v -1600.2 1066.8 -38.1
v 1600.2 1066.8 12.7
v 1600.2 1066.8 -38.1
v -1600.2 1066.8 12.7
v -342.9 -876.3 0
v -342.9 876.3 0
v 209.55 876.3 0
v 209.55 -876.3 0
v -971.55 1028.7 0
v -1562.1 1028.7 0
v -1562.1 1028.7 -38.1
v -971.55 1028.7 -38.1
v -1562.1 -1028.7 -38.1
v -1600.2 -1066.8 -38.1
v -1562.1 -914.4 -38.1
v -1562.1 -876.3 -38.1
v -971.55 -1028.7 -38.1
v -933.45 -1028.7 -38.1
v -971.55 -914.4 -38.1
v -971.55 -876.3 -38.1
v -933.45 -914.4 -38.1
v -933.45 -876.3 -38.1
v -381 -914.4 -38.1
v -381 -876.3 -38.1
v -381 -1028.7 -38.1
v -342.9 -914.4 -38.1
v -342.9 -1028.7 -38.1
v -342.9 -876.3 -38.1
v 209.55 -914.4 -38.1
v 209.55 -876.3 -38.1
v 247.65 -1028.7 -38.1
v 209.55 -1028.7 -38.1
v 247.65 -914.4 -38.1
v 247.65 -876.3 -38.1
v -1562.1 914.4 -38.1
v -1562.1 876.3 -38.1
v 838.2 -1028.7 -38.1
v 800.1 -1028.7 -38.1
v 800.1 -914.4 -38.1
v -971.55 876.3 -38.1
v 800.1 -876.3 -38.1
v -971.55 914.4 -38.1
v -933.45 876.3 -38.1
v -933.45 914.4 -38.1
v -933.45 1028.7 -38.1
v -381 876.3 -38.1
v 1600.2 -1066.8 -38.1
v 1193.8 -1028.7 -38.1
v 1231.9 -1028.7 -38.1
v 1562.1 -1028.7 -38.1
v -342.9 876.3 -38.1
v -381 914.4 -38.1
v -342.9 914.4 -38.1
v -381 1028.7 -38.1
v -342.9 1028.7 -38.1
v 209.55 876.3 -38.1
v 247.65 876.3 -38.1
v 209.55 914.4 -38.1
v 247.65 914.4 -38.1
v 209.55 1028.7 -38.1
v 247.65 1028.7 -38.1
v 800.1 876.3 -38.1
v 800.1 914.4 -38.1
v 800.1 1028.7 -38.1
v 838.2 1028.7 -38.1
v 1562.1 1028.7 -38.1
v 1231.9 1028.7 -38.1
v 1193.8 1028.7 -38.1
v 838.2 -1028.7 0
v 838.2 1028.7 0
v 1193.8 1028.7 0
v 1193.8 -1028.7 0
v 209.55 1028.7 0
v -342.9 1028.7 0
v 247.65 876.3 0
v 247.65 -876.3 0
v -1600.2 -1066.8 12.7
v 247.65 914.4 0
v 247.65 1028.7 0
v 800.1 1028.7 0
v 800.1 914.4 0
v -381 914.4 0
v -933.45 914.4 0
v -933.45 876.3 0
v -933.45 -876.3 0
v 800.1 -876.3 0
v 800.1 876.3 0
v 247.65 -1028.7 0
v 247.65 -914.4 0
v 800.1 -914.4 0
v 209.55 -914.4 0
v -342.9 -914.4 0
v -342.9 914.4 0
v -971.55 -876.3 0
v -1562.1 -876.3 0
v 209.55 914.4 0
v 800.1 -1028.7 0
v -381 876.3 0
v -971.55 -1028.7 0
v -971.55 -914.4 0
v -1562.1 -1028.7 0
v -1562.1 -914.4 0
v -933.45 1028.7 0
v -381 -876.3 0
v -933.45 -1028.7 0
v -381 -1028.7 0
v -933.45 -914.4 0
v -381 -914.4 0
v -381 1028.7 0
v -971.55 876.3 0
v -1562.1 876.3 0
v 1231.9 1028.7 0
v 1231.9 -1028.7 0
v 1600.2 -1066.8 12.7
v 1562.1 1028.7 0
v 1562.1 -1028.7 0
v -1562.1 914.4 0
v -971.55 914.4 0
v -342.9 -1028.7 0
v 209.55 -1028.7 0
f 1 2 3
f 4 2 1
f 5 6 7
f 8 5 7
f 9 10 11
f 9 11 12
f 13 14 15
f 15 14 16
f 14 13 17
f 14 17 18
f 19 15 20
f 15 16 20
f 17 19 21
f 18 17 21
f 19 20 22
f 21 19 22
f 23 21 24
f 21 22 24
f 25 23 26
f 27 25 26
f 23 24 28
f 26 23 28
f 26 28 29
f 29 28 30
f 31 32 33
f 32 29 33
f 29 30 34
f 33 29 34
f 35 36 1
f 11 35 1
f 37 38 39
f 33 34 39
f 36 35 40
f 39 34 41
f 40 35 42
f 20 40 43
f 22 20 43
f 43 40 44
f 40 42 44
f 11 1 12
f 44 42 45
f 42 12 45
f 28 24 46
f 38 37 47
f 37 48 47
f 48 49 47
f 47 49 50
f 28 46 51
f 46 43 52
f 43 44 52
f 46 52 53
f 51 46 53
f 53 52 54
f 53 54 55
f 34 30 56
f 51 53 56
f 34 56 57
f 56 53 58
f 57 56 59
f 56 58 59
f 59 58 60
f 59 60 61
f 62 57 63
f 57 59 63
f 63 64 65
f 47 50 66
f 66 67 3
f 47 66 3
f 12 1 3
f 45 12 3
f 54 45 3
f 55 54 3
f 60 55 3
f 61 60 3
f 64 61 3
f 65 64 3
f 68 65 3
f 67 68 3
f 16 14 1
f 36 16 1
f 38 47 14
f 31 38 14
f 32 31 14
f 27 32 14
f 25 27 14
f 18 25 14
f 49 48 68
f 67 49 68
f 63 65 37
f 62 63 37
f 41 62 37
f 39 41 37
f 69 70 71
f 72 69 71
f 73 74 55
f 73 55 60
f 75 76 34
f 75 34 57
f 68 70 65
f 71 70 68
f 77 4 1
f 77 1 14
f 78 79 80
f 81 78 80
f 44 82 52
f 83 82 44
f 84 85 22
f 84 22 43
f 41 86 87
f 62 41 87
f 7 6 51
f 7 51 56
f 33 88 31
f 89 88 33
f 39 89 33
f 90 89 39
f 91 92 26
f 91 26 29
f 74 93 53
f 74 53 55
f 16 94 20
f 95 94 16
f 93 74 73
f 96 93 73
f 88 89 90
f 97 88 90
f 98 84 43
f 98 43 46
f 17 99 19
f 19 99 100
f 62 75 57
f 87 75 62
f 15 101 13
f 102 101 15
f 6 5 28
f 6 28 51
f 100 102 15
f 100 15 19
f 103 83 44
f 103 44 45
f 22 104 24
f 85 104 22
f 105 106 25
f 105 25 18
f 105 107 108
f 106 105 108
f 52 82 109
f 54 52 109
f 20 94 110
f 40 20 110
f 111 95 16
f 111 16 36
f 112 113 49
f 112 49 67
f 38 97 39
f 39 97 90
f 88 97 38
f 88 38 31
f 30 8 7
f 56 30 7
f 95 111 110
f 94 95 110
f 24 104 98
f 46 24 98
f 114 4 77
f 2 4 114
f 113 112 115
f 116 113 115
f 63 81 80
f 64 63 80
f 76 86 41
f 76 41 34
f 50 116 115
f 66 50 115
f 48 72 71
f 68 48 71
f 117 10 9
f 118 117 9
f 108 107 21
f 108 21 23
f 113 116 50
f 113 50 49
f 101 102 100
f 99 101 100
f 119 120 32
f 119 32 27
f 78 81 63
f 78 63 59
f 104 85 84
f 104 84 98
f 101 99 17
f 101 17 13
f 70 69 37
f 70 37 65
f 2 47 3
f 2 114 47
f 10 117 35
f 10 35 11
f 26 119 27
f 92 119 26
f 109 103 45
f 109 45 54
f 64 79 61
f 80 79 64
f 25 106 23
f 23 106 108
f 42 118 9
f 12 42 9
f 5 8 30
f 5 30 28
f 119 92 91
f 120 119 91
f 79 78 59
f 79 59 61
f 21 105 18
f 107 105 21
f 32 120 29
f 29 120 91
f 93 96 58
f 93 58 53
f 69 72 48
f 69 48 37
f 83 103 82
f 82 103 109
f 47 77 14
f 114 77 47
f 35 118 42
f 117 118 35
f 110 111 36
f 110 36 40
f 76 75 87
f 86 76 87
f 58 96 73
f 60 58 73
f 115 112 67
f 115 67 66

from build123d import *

# Parameters (mm, degrees)
F0_W     = 38.1
F0_H     = 2057.4
F0_H_2   = 114.3
F0_W_2   = 330.2
F0_W_3   = 552.45
F0_H_3   = 1752.6
F0_W_4   = 590.55
F1_DEPTH = 12.7
F2_DEPTH = 38.1


with BuildPart() as f1:
    # F0 (on Top) → F1 (new body)
    with BuildSketch(Plane.XY):
        Polygon((1600.2, 1028.7), (1600.2, 1066.8), (838.2, 1066.8), (838.2, 1028.7), (1193.8, 1028.7), (1231.9, 1028.7), (1562.1, 1028.7), align=None)
        Polygon((838.2, 1028.7), (838.2, 1066.8), (-381, 1066.8), (-1600.2, 1066.8), (-1600.2, 1028.7), (-1562.1, 1028.7), (-971.55, 1028.7), (-933.45, 1028.7), (-381, 1028.7), (-342.9, 1028.7), (209.55, 1028.7), (247.65, 1028.7), (800.1, 1028.7), align=None)
        with Locations((1581.15, 0)):
            Rectangle(F0_W, F0_H)
        Polygon((1193.8, 1028.7), (838.2, 1028.7), (838.2, 914.4), (838.2, 876.3), (838.2, -876.3), (838.2, -914.4), (838.2, -1028.7), (1193.8, -1028.7), align=None)
        with Locations((819.15, 971.55)):
            Rectangle(F0_W, F0_H_2)
        Polygon((1600.2, -1066.8), (1600.2, -1028.7), (1562.1, -1028.7), (1231.9, -1028.7), (1193.8, -1028.7), (838.2, -1028.7), (800.1, -1028.7), (247.65, -1028.7), (209.55, -1028.7), (-342.9, -1028.7), (-381, -1028.7), (-381, -1066.8), align=None)
        with Locations((1397, 0)):
            Rectangle(F0_W_2, F0_H)
        Polygon((838.2, 876.3), (838.2, 914.4), (800.1, 914.4), (247.65, 914.4), (209.55, 914.4), (-342.9, 914.4), (-381, 914.4), (-933.45, 914.4), (-971.55, 914.4), (-1562.1, 914.4), (-1600.2, 914.4), (-1600.2, 876.3), (-1562.1, 876.3), (-971.55, 876.3), (-933.45, 876.3), (-381, 876.3), (-342.9, 876.3), (209.55, 876.3), (247.65, 876.3), (800.1, 876.3), align=None)
        with Locations((523.875, 971.55)):
            Rectangle(F0_W_3, F0_H_2)
        with Locations((1212.85, 0)):
            Rectangle(F0_W, F0_H)
        with Locations((-1581.15, 971.55)):
            Rectangle(F0_W, F0_H_2)
        with Locations((819.15, 0)):
            Rectangle(F0_W, F0_H_3)
        with Locations((228.6, 971.55)):
            Rectangle(F0_W, F0_H_2)
        Polygon((-1600.2, -1066.8), (-381, -1066.8), (-381, -1028.7), (-933.45, -1028.7), (-971.55, -1028.7), (-1562.1, -1028.7), (-1600.2, -1028.7), align=None)
        with Locations((-1266.825, 971.55)):
            Rectangle(F0_W_4, F0_H_2)
        Polygon((838.2, -914.4), (838.2, -876.3), (800.1, -876.3), (247.65, -876.3), (209.55, -876.3), (-342.9, -876.3), (-381, -876.3), (-933.45, -876.3), (-971.55, -876.3), (-1562.1, -876.3), (-1600.2, -876.3), (-1600.2, -914.4), (-1562.1, -914.4), (-971.55, -914.4), (-933.45, -914.4), (-381, -914.4), (-342.9, -914.4), (209.55, -914.4), (247.65, -914.4), (800.1, -914.4), align=None)
        with Locations((523.875, 0)):
            Rectangle(F0_W_3, F0_H_3)
        with Locations((-66.675, 971.55)):
            Rectangle(F0_W_3, F0_H_2)
        with Locations((819.15, -971.55)):
            Rectangle(F0_W, F0_H_2)
        with Locations((-361.95, -971.55)):
            Rectangle(F0_W, F0_H_2)
        with Locations((-657.225, -971.55)):
            Rectangle(F0_W_3, F0_H_2)
        with Locations((-1581.15, 0)):
            Rectangle(F0_W, F0_H_3)
        with Locations((-952.5, 971.55)):
            Rectangle(F0_W, F0_H_2)
        with Locations((228.6, 0)):
            Rectangle(F0_W, F0_H_3)
        with Locations((-361.95, 971.55)):
            Rectangle(F0_W, F0_H_2)
        with Locations((523.875, -971.55)):
            Rectangle(F0_W_3, F0_H_2)
        with Locations((-1581.15, -971.55)):
            Rectangle(F0_W, F0_H_2)
        with Locations((-952.5, -971.55)):
            Rectangle(F0_W, F0_H_2)
        with Locations((-66.675, -971.55)):
            Rectangle(F0_W_3, F0_H_2)
        with Locations((-1266.825, 0)):
            Rectangle(F0_W_4, F0_H_3)
        with Locations((-657.225, 971.55)):
            Rectangle(F0_W_3, F0_H_2)
        with Locations((-66.675, 0)):
            Rectangle(F0_W_3, F0_H_3)
        with Locations((228.6, -971.55)):
            Rectangle(F0_W, F0_H_2)
        with Locations((-1266.825, -971.55)):
            Rectangle(F0_W_4, F0_H_2)
        with Locations((-952.5, 0)):
            Rectangle(F0_W, F0_H_3)
        with Locations((-361.95, 0)):
            Rectangle(F0_W, F0_H_3)
        with Locations((-657.225, 0)):
            Rectangle(F0_W_3, F0_H_3)
    extrude(amount=F1_DEPTH)

    # F0 (on Top) → F2 (join)
    with BuildSketch(Plane.XY):
        Polygon((1600.2, 1028.7), (1600.2, 1066.8), (838.2, 1066.8), (838.2, 1028.7), (1193.8, 1028.7), (1231.9, 1028.7), (1562.1, 1028.7), align=None)
        Polygon((838.2, 1028.7), (838.2, 1066.8), (-381, 1066.8), (-1600.2, 1066.8), (-1600.2, 1028.7), (-1562.1, 1028.7), (-971.55, 1028.7), (-933.45, 1028.7), (-381, 1028.7), (-342.9, 1028.7), (209.55, 1028.7), (247.65, 1028.7), (800.1, 1028.7), align=None)
        with Locations((1581.15, 0)):
            Rectangle(F0_W, F0_H)
        with Locations((819.15, 971.55)):
            Rectangle(F0_W, F0_H_2)
        Polygon((1600.2, -1066.8), (1600.2, -1028.7), (1562.1, -1028.7), (1231.9, -1028.7), (1193.8, -1028.7), (838.2, -1028.7), (800.1, -1028.7), (247.65, -1028.7), (209.55, -1028.7), (-342.9, -1028.7), (-381, -1028.7), (-381, -1066.8), align=None)
        Polygon((838.2, 876.3), (838.2, 914.4), (800.1, 914.4), (247.65, 914.4), (209.55, 914.4), (-342.9, 914.4), (-381, 914.4), (-933.45, 914.4), (-971.55, 914.4), (-1562.1, 914.4), (-1600.2, 914.4), (-1600.2, 876.3), (-1562.1, 876.3), (-971.55, 876.3), (-933.45, 876.3), (-381, 876.3), (-342.9, 876.3), (209.55, 876.3), (247.65, 876.3), (800.1, 876.3), align=None)
        with Locations((1212.85, 0)):
            Rectangle(F0_W, F0_H)
        with Locations((-1581.15, 971.55)):
            Rectangle(F0_W, F0_H_2)
        with Locations((819.15, 0)):
            Rectangle(F0_W, F0_H_3)
        with Locations((228.6, 971.55)):
            Rectangle(F0_W, F0_H_2)
        Polygon((-1600.2, -1066.8), (-381, -1066.8), (-381, -1028.7), (-933.45, -1028.7), (-971.55, -1028.7), (-1562.1, -1028.7), (-1600.2, -1028.7), align=None)
        Polygon((838.2, -914.4), (838.2, -876.3), (800.1, -876.3), (247.65, -876.3), (209.55, -876.3), (-342.9, -876.3), (-381, -876.3), (-933.45, -876.3), (-971.55, -876.3), (-1562.1, -876.3), (-1600.2, -876.3), (-1600.2, -914.4), (-1562.1, -914.4), (-971.55, -914.4), (-933.45, -914.4), (-381, -914.4), (-342.9, -914.4), (209.55, -914.4), (247.65, -914.4), (800.1, -914.4), align=None)
        with Locations((819.15, -971.55)):
            Rectangle(F0_W, F0_H_2)
        with Locations((-361.95, -971.55)):
            Rectangle(F0_W, F0_H_2)
        with Locations((-1581.15, 0)):
            Rectangle(F0_W, F0_H_3)
        with Locations((-952.5, 971.55)):
            Rectangle(F0_W, F0_H_2)
        with Locations((228.6, 0)):
            Rectangle(F0_W, F0_H_3)
        with Locations((-361.95, 971.55)):
            Rectangle(F0_W, F0_H_2)
        with Locations((-1581.15, -971.55)):
            Rectangle(F0_W, F0_H_2)
        with Locations((-952.5, -971.55)):
            Rectangle(F0_W, F0_H_2)
        with Locations((228.6, -971.55)):
            Rectangle(F0_W, F0_H_2)
        with Locations((-952.5, 0)):
            Rectangle(F0_W, F0_H_3)
        with Locations((-361.95, 0)):
            Rectangle(F0_W, F0_H_3)
    extrude(amount=-F2_DEPTH)


solid = f1.part
